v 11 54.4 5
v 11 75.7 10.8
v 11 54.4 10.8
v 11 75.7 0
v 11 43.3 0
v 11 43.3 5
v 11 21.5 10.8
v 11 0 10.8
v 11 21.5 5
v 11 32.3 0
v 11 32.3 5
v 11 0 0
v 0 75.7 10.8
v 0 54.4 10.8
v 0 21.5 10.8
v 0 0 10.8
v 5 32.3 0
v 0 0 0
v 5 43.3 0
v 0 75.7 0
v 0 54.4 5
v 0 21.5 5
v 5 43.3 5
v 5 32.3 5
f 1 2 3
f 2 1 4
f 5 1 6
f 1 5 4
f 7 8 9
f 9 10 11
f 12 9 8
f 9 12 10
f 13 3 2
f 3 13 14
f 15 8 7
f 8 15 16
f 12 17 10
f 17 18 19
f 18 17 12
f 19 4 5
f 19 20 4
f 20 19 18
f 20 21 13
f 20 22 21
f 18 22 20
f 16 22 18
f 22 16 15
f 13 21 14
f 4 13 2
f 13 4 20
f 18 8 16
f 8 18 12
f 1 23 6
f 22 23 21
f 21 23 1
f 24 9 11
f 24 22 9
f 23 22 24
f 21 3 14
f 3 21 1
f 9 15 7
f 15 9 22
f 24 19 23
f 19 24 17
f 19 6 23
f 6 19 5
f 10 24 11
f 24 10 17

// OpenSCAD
difference(){
cube ([11,75.7,10.8]);
translate([-1,21.5,5]) cube([13,32.9,7]);
translate([5,32.3,-1]) cube([7,11,7]);
}
